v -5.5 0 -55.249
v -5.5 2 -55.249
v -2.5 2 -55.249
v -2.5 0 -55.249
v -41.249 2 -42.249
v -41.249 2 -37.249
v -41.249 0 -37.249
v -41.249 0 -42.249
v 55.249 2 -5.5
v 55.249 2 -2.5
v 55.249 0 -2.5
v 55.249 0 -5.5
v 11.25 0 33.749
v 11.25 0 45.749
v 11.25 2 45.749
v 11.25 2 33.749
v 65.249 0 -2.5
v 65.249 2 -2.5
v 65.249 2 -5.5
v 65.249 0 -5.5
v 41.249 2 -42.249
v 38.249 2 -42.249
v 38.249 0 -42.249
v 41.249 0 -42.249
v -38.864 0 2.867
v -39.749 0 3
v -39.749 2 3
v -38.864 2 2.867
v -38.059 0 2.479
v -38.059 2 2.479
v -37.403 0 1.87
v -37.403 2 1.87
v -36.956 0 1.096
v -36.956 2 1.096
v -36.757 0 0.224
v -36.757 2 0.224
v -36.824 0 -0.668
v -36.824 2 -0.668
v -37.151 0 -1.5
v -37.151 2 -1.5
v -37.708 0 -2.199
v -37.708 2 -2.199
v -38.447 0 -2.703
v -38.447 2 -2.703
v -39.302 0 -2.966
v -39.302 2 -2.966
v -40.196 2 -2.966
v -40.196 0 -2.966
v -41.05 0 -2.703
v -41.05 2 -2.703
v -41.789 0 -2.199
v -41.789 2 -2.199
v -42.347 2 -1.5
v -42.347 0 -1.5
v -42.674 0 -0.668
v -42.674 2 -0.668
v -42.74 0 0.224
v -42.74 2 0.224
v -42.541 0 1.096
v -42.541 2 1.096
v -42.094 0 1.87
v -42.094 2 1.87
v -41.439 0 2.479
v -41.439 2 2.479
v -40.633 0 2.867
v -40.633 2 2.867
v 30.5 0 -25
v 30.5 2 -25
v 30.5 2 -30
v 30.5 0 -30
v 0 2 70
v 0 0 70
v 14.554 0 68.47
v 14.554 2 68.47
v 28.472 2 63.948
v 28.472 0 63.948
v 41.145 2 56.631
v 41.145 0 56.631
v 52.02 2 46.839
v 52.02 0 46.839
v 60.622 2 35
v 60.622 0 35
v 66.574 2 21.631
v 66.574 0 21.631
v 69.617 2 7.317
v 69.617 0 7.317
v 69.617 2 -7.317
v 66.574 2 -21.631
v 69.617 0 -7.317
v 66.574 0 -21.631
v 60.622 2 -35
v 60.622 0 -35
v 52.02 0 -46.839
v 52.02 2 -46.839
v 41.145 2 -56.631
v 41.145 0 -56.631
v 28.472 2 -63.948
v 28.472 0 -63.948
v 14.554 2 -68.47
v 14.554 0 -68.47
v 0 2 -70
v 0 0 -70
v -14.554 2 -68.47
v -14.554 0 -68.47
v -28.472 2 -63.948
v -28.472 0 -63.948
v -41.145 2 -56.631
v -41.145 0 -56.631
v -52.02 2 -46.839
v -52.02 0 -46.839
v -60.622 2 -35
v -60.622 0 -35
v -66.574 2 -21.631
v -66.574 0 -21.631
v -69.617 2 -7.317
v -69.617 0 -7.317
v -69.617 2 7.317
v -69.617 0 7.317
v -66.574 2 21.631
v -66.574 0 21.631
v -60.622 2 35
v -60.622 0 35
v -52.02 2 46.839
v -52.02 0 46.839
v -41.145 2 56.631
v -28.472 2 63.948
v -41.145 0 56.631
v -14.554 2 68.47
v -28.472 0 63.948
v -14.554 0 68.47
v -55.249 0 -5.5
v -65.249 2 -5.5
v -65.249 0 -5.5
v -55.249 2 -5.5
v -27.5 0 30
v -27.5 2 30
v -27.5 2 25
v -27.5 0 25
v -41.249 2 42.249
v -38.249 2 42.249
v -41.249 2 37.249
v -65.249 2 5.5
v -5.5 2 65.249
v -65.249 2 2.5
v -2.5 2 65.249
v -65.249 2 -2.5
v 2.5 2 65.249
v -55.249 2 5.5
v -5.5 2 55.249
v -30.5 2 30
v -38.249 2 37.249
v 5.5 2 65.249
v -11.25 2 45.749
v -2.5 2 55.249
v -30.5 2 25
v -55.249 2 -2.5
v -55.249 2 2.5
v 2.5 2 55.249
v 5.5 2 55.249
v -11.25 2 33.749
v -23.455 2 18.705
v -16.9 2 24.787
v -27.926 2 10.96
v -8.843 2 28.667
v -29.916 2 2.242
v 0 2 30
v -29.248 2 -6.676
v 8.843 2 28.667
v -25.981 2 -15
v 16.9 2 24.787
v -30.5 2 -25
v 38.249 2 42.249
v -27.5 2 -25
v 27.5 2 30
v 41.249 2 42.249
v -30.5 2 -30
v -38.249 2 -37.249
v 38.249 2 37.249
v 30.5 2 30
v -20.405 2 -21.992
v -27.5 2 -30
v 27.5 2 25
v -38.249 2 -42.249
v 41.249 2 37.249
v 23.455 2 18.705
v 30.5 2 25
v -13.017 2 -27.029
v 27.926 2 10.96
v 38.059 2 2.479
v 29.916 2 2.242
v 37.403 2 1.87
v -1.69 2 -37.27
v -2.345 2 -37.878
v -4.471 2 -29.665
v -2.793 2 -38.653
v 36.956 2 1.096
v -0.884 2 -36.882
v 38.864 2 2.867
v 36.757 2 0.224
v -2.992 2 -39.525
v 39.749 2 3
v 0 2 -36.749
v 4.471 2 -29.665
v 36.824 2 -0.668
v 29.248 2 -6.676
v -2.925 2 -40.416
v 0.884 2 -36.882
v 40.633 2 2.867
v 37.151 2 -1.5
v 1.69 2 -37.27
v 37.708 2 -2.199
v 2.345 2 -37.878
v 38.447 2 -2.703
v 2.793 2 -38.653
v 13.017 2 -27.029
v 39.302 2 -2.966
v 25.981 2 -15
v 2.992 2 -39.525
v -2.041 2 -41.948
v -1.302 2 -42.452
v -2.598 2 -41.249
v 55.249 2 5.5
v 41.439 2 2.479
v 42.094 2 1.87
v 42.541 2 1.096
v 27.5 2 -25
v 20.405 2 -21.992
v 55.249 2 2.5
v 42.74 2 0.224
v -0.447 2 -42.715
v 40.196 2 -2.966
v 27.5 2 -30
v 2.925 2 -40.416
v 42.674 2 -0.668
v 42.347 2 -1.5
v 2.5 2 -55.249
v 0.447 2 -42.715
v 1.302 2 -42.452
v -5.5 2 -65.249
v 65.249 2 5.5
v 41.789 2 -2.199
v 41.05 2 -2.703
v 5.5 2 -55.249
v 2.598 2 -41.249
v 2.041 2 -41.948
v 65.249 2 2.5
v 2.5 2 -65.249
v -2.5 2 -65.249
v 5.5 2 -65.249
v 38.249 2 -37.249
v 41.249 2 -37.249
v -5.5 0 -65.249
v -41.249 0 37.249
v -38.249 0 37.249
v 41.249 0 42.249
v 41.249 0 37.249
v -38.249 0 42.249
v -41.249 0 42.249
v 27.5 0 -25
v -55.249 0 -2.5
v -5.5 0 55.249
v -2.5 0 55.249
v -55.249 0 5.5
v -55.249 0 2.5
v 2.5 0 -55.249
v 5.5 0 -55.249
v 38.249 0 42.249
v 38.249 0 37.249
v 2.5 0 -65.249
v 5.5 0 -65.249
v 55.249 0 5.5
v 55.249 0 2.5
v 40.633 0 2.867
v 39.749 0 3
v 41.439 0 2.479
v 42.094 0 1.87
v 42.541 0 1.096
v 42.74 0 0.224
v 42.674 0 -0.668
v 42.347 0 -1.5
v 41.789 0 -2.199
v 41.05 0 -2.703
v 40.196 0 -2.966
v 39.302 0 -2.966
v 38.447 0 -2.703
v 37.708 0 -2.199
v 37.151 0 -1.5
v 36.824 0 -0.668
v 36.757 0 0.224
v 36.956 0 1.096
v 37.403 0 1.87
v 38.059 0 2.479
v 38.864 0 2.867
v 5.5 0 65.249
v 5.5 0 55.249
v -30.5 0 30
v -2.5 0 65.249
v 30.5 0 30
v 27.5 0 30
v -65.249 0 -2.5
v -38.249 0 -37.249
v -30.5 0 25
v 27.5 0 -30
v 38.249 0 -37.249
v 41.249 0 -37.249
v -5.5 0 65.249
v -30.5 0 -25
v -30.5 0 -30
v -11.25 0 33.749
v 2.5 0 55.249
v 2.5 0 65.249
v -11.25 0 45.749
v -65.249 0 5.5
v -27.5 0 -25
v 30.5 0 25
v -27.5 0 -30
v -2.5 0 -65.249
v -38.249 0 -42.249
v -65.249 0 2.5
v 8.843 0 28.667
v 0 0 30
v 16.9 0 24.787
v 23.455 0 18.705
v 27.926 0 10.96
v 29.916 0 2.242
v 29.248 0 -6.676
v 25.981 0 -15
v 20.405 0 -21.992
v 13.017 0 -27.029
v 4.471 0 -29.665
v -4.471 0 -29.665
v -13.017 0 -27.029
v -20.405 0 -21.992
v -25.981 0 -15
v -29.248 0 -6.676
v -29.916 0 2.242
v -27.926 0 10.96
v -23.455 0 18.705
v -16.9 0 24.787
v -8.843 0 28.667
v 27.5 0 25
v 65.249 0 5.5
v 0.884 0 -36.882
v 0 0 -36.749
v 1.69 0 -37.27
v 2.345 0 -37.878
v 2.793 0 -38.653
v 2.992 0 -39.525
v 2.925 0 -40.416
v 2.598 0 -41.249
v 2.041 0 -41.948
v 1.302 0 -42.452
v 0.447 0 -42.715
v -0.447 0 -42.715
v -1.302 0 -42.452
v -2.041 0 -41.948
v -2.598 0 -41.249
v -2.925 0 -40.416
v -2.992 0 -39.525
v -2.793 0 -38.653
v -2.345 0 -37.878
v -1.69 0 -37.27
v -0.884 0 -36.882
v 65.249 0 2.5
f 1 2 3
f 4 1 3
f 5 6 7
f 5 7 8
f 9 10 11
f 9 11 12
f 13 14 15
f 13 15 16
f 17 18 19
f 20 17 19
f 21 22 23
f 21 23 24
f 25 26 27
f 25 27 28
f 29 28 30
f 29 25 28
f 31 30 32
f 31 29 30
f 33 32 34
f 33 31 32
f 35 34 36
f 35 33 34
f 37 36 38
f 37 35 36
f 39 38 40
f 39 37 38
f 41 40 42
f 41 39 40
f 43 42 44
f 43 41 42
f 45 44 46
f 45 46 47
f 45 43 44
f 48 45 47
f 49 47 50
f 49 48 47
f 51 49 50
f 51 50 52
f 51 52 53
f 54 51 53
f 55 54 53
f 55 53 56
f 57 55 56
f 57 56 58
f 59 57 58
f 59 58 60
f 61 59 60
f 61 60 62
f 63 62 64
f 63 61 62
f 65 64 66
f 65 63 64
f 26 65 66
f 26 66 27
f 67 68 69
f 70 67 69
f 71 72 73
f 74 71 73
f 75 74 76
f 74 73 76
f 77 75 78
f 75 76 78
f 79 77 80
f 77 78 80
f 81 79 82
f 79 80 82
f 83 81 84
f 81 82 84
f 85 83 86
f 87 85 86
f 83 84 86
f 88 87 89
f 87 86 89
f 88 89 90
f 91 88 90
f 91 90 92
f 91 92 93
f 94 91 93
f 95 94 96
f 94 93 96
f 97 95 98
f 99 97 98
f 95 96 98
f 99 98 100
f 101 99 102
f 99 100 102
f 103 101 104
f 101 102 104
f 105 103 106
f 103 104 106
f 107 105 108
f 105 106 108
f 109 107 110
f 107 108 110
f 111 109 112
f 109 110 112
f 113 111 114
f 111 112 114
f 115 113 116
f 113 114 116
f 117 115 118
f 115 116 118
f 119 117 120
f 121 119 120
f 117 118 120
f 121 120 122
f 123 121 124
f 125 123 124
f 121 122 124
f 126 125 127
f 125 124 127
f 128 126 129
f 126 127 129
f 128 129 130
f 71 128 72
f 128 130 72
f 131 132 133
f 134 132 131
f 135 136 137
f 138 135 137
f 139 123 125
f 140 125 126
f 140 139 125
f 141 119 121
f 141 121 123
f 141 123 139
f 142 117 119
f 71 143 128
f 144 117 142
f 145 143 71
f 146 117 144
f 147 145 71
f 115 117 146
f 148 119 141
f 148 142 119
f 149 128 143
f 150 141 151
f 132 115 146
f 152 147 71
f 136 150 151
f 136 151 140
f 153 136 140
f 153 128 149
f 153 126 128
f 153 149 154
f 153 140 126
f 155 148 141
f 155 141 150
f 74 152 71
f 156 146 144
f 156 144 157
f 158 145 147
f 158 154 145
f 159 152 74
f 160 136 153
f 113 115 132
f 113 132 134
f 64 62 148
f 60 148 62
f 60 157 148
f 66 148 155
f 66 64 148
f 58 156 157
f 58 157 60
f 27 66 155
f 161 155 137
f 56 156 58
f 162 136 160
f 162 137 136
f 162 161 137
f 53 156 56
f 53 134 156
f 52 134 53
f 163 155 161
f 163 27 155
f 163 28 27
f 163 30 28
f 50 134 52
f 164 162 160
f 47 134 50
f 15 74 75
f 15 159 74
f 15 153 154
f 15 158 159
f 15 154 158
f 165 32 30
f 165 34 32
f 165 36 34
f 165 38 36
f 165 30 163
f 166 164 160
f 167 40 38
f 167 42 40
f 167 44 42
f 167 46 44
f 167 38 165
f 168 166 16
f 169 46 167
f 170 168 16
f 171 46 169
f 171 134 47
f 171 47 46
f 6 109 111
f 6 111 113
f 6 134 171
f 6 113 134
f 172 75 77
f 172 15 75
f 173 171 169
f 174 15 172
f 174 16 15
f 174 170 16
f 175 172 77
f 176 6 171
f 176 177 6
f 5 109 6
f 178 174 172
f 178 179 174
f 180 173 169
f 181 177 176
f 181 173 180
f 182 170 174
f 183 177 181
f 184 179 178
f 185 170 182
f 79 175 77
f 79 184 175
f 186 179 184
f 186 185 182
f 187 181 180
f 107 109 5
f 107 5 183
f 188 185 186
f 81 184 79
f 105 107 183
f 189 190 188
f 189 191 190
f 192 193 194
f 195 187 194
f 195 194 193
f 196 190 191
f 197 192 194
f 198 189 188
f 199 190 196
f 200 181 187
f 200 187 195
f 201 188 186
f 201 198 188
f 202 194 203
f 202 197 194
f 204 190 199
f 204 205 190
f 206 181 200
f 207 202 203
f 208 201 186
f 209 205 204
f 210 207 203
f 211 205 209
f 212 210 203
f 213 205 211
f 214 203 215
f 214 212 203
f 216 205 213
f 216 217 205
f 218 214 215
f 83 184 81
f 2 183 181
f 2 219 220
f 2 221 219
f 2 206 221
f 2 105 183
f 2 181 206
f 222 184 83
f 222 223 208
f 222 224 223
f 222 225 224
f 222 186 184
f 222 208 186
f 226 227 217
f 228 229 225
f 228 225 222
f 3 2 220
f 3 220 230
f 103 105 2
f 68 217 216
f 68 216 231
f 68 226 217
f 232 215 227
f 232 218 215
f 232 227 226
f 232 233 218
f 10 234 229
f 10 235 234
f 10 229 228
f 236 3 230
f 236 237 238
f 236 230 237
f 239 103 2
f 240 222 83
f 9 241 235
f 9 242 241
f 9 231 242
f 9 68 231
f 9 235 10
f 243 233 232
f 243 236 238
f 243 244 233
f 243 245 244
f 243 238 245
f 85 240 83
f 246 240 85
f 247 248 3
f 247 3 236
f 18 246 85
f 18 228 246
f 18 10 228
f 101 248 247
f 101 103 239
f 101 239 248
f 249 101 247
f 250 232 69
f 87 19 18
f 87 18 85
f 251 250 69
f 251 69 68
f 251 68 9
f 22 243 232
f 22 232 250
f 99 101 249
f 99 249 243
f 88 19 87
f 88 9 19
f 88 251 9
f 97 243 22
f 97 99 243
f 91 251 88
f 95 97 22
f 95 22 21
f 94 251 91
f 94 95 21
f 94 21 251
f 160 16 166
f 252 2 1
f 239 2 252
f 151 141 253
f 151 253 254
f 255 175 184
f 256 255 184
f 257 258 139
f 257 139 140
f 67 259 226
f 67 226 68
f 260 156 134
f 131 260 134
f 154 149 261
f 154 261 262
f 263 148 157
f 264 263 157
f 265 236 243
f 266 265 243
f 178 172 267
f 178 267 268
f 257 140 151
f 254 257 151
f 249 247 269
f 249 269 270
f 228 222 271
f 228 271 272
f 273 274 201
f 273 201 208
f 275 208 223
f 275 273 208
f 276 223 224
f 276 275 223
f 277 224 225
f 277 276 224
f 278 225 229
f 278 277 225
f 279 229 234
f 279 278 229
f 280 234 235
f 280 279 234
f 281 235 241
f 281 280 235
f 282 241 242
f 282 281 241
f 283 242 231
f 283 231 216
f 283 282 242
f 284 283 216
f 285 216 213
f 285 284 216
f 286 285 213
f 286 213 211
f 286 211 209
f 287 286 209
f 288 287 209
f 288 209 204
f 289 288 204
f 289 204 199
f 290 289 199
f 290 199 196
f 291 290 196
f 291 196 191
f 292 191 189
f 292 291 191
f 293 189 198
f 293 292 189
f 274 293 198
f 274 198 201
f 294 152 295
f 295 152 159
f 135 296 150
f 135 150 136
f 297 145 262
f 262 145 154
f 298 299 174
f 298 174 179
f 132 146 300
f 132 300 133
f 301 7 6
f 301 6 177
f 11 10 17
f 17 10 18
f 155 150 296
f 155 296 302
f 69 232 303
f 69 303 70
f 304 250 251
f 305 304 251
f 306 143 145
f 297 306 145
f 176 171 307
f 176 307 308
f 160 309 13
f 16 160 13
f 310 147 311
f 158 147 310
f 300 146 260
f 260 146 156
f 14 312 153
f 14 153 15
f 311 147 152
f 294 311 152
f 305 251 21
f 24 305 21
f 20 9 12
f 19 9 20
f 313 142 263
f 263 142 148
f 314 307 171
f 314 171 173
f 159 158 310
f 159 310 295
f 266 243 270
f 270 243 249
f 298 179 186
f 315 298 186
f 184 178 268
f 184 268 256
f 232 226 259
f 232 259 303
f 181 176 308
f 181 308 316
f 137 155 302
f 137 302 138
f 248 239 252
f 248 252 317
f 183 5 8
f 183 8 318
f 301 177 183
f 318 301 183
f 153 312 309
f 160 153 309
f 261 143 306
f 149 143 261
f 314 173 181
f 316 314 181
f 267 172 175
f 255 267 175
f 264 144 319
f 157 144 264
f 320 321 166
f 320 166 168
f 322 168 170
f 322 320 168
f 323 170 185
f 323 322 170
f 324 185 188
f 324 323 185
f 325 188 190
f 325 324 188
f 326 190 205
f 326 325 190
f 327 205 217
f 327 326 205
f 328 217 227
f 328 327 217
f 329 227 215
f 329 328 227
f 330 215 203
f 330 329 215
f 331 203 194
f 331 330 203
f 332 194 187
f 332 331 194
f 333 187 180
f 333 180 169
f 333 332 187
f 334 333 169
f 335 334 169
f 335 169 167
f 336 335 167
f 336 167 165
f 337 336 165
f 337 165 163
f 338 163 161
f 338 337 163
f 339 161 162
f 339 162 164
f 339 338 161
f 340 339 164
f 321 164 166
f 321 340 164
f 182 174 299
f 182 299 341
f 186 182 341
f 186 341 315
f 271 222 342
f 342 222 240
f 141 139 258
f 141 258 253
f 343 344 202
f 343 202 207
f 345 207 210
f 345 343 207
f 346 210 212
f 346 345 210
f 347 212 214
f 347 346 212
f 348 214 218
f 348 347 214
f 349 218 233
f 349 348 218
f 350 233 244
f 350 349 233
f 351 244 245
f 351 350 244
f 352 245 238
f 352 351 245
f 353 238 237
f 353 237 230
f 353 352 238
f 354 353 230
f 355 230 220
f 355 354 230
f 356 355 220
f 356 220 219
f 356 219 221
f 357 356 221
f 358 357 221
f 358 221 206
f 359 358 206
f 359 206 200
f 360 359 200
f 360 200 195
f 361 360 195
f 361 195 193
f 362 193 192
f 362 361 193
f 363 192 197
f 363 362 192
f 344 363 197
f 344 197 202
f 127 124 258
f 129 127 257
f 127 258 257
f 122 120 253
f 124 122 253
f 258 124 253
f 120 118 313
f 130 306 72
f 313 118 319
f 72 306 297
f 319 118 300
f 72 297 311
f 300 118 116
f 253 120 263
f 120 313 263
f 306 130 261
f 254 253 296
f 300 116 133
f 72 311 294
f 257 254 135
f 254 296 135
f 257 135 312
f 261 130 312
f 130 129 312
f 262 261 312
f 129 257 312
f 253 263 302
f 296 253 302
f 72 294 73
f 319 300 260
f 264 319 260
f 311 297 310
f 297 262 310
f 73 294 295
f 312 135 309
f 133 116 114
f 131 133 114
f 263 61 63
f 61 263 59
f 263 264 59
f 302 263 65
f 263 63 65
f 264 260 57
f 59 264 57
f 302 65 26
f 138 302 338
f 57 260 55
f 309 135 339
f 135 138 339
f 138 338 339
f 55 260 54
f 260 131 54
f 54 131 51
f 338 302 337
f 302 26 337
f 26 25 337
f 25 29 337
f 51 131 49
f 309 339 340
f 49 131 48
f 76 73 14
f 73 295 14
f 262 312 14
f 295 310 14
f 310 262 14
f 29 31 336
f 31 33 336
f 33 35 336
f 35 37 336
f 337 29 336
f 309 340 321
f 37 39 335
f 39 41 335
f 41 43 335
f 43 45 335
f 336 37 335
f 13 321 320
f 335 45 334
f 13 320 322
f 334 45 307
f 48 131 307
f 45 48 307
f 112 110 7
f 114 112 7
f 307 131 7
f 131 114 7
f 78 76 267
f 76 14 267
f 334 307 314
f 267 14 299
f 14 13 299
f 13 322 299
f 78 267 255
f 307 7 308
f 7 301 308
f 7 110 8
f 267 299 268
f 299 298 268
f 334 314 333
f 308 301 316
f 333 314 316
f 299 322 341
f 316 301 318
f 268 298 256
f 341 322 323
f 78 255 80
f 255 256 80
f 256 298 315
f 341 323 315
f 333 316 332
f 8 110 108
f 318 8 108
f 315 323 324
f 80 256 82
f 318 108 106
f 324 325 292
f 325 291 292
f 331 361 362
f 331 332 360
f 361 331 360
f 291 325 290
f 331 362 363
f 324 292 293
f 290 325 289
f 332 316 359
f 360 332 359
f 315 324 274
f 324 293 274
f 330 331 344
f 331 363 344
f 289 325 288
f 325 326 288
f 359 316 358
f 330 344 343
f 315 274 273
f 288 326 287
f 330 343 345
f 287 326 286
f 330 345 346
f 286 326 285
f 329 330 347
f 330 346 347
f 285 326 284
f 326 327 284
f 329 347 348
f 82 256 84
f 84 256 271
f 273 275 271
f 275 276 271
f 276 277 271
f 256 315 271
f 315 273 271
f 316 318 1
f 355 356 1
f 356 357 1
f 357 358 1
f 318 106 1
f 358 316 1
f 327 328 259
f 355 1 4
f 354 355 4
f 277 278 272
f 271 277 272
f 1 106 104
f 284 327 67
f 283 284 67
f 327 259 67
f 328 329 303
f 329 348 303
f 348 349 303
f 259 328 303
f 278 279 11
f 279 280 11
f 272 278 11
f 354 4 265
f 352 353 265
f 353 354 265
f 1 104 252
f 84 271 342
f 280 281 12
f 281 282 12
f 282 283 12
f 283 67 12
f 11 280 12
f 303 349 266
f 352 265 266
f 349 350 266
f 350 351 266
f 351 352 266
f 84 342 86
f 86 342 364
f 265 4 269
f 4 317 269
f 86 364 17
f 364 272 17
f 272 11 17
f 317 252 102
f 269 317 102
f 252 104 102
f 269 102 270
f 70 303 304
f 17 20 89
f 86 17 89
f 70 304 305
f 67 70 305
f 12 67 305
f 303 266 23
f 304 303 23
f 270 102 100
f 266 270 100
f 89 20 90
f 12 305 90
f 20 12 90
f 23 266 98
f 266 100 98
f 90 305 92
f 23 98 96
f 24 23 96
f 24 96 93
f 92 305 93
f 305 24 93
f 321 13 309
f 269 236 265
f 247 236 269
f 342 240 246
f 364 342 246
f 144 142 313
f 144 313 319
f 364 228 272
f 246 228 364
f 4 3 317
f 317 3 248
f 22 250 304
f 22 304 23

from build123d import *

# Parameters (mm, degrees)
SKETCH1_R                   = 70
SKETCH1_R_2                 = 30
SKETCH1_R_3                 = 3
SKETCH1_W                   = 2
SKETCH1_H                   = 5
SKETCH1_W_2                 = 22.5
SKETCH1_H_2                 = 12
SKETCH1_W_3                 = 5
SKETCH1_H_3                 = 2
Y_KSEKLIK_EKSTR_ZYON1_DEPTH = 2
SKETCH3_W                   = 2
SKETCH3_H                   = 2
SKETCH3_W_2                 = 3
BOSS_EXTRUDE1_DEPTH         = 2
SKETCH5_W                   = 5
SKETCH5_H                   = 2
CUT_EXTRUDE1_DEPTH          = 2
SKETCH6_W                   = 2
SKETCH6_H                   = 2
SKETCH6_W_2                 = 3
BOSS_EXTRUDE3_DEPTH         = 2
SKETCH8_W                   = 5
SKETCH8_H                   = 2
CUT_EXTRUDE2_DEPTH          = 2
SKETCH9_W                   = 2
SKETCH9_H                   = 2
SKETCH9_H_2                 = 3
BOSS_EXTRUDE4_DEPTH         = 2
SKETCH10_W                  = 2
SKETCH10_H                  = 2
SKETCH10_H_2                = 3
BOSS_EXTRUDE5_DEPTH         = 2
SKETCH12_W                  = 2
SKETCH12_H                  = 5
CUT_EXTRUDE4_DEPTH          = 2
SKETCH13_W                  = 2
SKETCH13_H                  = 5
CUT_EXTRUDE5_DEPTH          = 2
SKETCH14_W                  = 3
SKETCH14_H                  = 2
SKETCH14_W_2                = 2
BOSS_EXTRUDE6_DEPTH         = 2
SKETCH15_W                  = 5
SKETCH15_H                  = 2
CUT_EXTRUDE6_DEPTH          = 2
SKETCH16_W                  = 3
SKETCH16_H                  = 2
SKETCH16_W_2                = 2
BOSS_EXTRUDE9_DEPTH         = 2
SKETCH17_W                  = 5
SKETCH17_H                  = 2
CUT_EXTRUDE7_DEPTH          = 2
SKETCH18_W                  = 2
SKETCH18_H                  = 3
SKETCH18_H_2                = 2
BOSS_EXTRUDE10_DEPTH        = 2
SKETCH19_W                  = 2
SKETCH19_H                  = 5
CUT_EXTRUDE8_DEPTH          = 2
SKETCH20_W                  = 3
SKETCH20_H                  = 10
SKETCH20_W_2                = 10
SKETCH20_H_2                = 3
SKETCH20_H_3                = 5
CUT_EXTRUDE9_DEPTH          = 2


with BuildPart() as part:
    # Sketch1 → Yükseklik-Ekstrüzyon1 (new body)
    with BuildSketch(Plane(origin=(0, 0, 0), x_dir=(1, 0, 0), z_dir=(0, 1, 0))):
        with Locations(Location((0, 0, 0), (0, 0, 270))):
            Circle(SKETCH1_R)
        with Locations(Location((0, 0, 0), (0, 0, 270))):
            Circle(SKETCH1_R_2, mode=Mode.SUBTRACT)
        with Locations(Location((39.748737342, 0, 0), (0, 0, 270))):
            Circle(SKETCH1_R_3, mode=Mode.SUBTRACT)
        with Locations(Location((-39.748737342, 0, 0), (0, 0, 270))):
            Circle(SKETCH1_R_3, mode=Mode.SUBTRACT)
        with Locations(Location((0, 39.748737342, 0), (0, 0, 270))):
            Circle(SKETCH1_R_3, mode=Mode.SUBTRACT)
        with Locations((-29, 27.5)):
            Rectangle(SKETCH1_W, SKETCH1_H, mode=Mode.SUBTRACT)
        with Locations((29, 27.5)):
            Rectangle(SKETCH1_W, SKETCH1_H, mode=Mode.SUBTRACT)
        with Locations((-29, -27.5)):
            Rectangle(SKETCH1_W, SKETCH1_H, mode=Mode.SUBTRACT)
        with Locations((29, -27.5)):
            Rectangle(SKETCH1_W, SKETCH1_H, mode=Mode.SUBTRACT)
        with Locations((-39.748737342, 39.748737342)):
            Rectangle(SKETCH1_W, SKETCH1_H, mode=Mode.SUBTRACT)
        with Locations((39.748737342, 39.748737342)):
            Rectangle(SKETCH1_W, SKETCH1_H, mode=Mode.SUBTRACT)
        with Locations((39.748737342, -39.748737342)):
            Rectangle(SKETCH1_W, SKETCH1_H, mode=Mode.SUBTRACT)
        with Locations((-39.748737342, -39.748737342)):
            Rectangle(SKETCH1_W, SKETCH1_H, mode=Mode.SUBTRACT)
        with Locations((0, -39.748737342)):
            Rectangle(SKETCH1_W_2, SKETCH1_H_2, mode=Mode.SUBTRACT)
        with Locations((-64.748737342, 4)):
            Rectangle(SKETCH1_W_3, SKETCH1_H_3, mode=Mode.SUBTRACT)
        with Locations((-64.748737342, -4)):
            Rectangle(SKETCH1_W_3, SKETCH1_H_3, mode=Mode.SUBTRACT)
        with Locations((-54.748737342, -4)):
            Rectangle(SKETCH1_W_3, SKETCH1_H_3, mode=Mode.SUBTRACT)
        with Locations((-54.748737342, 4)):
            Rectangle(SKETCH1_W_3, SKETCH1_H_3, mode=Mode.SUBTRACT)
        with Locations((-4, 64.748737342)):
            Rectangle(SKETCH1_W, SKETCH1_H, mode=Mode.SUBTRACT)
        with Locations((-4, 54.748737342)):
            Rectangle(SKETCH1_W, SKETCH1_H, mode=Mode.SUBTRACT)
        with Locations((4, 54.748737342)):
            Rectangle(SKETCH1_W, SKETCH1_H, mode=Mode.SUBTRACT)
        with Locations((4, 64.748737342)):
            Rectangle(SKETCH1_W, SKETCH1_H, mode=Mode.SUBTRACT)
        with Locations((54.748737342, 4)):
            Rectangle(SKETCH1_W_3, SKETCH1_H_3, mode=Mode.SUBTRACT)
        with Locations((54.748737342, -4)):
            Rectangle(SKETCH1_W_3, SKETCH1_H_3, mode=Mode.SUBTRACT)
        with Locations((64.748737342, 4)):
            Rectangle(SKETCH1_W_3, SKETCH1_H_3, mode=Mode.SUBTRACT)
        with Locations((64.748737342, -4)):
            Rectangle(SKETCH1_W_3, SKETCH1_H_3, mode=Mode.SUBTRACT)
        with Locations((-4, -54.748737342)):
            Rectangle(SKETCH1_W, SKETCH1_H, mode=Mode.SUBTRACT)
        with Locations((4, -54.748737342)):
            Rectangle(SKETCH1_W, SKETCH1_H, mode=Mode.SUBTRACT)
        with Locations((4, -64.748737342)):
            Rectangle(SKETCH1_W, SKETCH1_H, mode=Mode.SUBTRACT)
        with Locations((-4, -64.748737342)):
            Rectangle(SKETCH1_W, SKETCH1_H, mode=Mode.SUBTRACT)
    extrude(amount=Y_KSEKLIK_EKSTR_ZYON1_DEPTH)

    # Sketch3 → Boss-Extrude1 (add)
    with BuildSketch(Plane(origin=(0, 2, 0), x_dir=(1, 0, 0), z_dir=(0, 1, 0))):
        with Locations((-66.248737342, 4)):
            Rectangle(SKETCH3_W, SKETCH3_H)
        with Locations((-53.748737342, 4)):
            Rectangle(SKETCH3_W_2, SKETCH3_H)
    extrude(amount=-BOSS_EXTRUDE1_DEPTH)

    # Sketch5 → Cut-Extrude1 (cut)
    with BuildSketch(Plane(origin=(0, 2, 0), x_dir=(1, 0, 0), z_dir=(0, 1, 0))):
        with Locations((-59.748737342, 4)):
            Rectangle(SKETCH5_W, SKETCH5_H)
    extrude(amount=-CUT_EXTRUDE1_DEPTH, mode=Mode.SUBTRACT)

    # Sketch6 → Boss-Extrude3 (add)
    with BuildSketch(Plane(origin=(0, 2, 0), x_dir=(1, 0, 0), z_dir=(0, 1, 0))):
        with Locations((-66.248737342, -4)):
            Rectangle(SKETCH6_W, SKETCH6_H)
        with Locations((-53.748737342, -4)):
            Rectangle(SKETCH6_W_2, SKETCH6_H)
    extrude(amount=-BOSS_EXTRUDE3_DEPTH)

    # Sketch8 → Cut-Extrude2 (cut)
    with BuildSketch(Plane(origin=(0, 2, 0), x_dir=(1, 0, 0), z_dir=(0, 1, 0))):
        with Locations((-59.748737342, -4)):
            Rectangle(SKETCH8_W, SKETCH8_H)
    extrude(amount=-CUT_EXTRUDE2_DEPTH, mode=Mode.SUBTRACT)

    # Sketch9 → Boss-Extrude4 (add)
    with BuildSketch(Plane(origin=(0, 2, 0), x_dir=(1, 0, 0), z_dir=(0, 1, 0))):
        with Locations((4, 66.248737342)):
            Rectangle(SKETCH9_W, SKETCH9_H)
        with Locations((4, 53.748737342)):
            Rectangle(SKETCH9_W, SKETCH9_H_2)
    extrude(amount=-BOSS_EXTRUDE4_DEPTH)

    # Sketch10 → Boss-Extrude5 (add)
    with BuildSketch(Plane(origin=(0, 2, 0), x_dir=(1, 0, 0), z_dir=(0, 1, 0))):
        with Locations((-4, 66.248737342)):
            Rectangle(SKETCH10_W, SKETCH10_H)
        with Locations((-4, 53.748737342)):
            Rectangle(SKETCH10_W, SKETCH10_H_2)
    extrude(amount=-BOSS_EXTRUDE5_DEPTH)

    # Sketch12 → Cut-Extrude4 (cut)
    with BuildSketch(Plane(origin=(0, 2, 0), x_dir=(1, 0, 0), z_dir=(0, 1, 0))):
        with Locations((-4, 59.748737342)):
            Rectangle(SKETCH12_W, SKETCH12_H)
    extrude(amount=-CUT_EXTRUDE4_DEPTH, mode=Mode.SUBTRACT)

    # Sketch13 → Cut-Extrude5 (cut)
    with BuildSketch(Plane(origin=(0, 2, 0), x_dir=(1, 0, 0), z_dir=(0, 1, 0))):
        with Locations((4, 59.748737342)):
            Rectangle(SKETCH13_W, SKETCH13_H)
    extrude(amount=-CUT_EXTRUDE5_DEPTH, mode=Mode.SUBTRACT)

    # Sketch14 → Boss-Extrude6 (add)
    with BuildSketch(Plane(origin=(0, 2, 0), x_dir=(1, 0, 0), z_dir=(0, 1, 0))):
        with Locations((53.748737342, 4)):
            Rectangle(SKETCH14_W, SKETCH14_H)
        with Locations((66.248737342, 4)):
            Rectangle(SKETCH14_W_2, SKETCH14_H)
    extrude(amount=-BOSS_EXTRUDE6_DEPTH)

    # Sketch15 → Cut-Extrude6 (cut)
    with BuildSketch(Plane(origin=(0, 2, 0), x_dir=(1, 0, 0), z_dir=(0, 1, 0))):
        with Locations((59.748737342, 4)):
            Rectangle(SKETCH15_W, SKETCH15_H)
    extrude(amount=-CUT_EXTRUDE6_DEPTH, mode=Mode.SUBTRACT)

    # Sketch16 → Boss-Extrude9 (add)
    with BuildSketch(Plane(origin=(0, 2, 0), x_dir=(1, 0, 0), z_dir=(0, 1, 0))):
        with Locations((53.748737342, -4)):
            Rectangle(SKETCH16_W, SKETCH16_H)
        with Locations((66.248737342, -4)):
            Rectangle(SKETCH16_W_2, SKETCH16_H)
    extrude(amount=-BOSS_EXTRUDE9_DEPTH)

    # Sketch17 → Cut-Extrude7 (cut)
    with BuildSketch(Plane(origin=(0, 2, 0), x_dir=(1, 0, 0), z_dir=(0, 1, 0))):
        with Locations((59.748737342, -4)):
            Rectangle(SKETCH17_W, SKETCH17_H)
    extrude(amount=-CUT_EXTRUDE7_DEPTH, mode=Mode.SUBTRACT)

    # Sketch18 → Boss-Extrude10 (add)
    with BuildSketch(Plane(origin=(0, 2, 0), x_dir=(1, 0, 0), z_dir=(0, 1, 0))):
        with Locations((-4, -53.748737342)):
            Rectangle(SKETCH18_W, SKETCH18_H)
        with Locations((-4, -66.248737342)):
            Rectangle(SKETCH18_W, SKETCH18_H_2)
        with Locations((4, -66.248737342)):
            Rectangle(SKETCH18_W, SKETCH18_H_2)
        with Locations((4, -53.748737342)):
            Rectangle(SKETCH18_W, SKETCH18_H)
    extrude(amount=-BOSS_EXTRUDE10_DEPTH)

    # Sketch19 → Cut-Extrude8 (cut)
    with BuildSketch(Plane(origin=(0, 2, 0), x_dir=(1, 0, 0), z_dir=(0, 1, 0))):
        with Locations((4, -59.748737342)):
            Rectangle(SKETCH19_W, SKETCH19_H)
        with Locations((-4, -59.748737342)):
            Rectangle(SKETCH19_W, SKETCH19_H)
    extrude(amount=-CUT_EXTRUDE8_DEPTH, mode=Mode.SUBTRACT)

    # Sketch20 → Cut-Extrude9 (cut)
    with BuildSketch(Plane(origin=(0, 2, 0), x_dir=(1, 0, 0), z_dir=(0, 1, 0))):
        with Locations((-4, 60.248737342)):
            Rectangle(SKETCH20_W, SKETCH20_H)
        with Locations((4, 60.248737342)):
            Rectangle(SKETCH20_W, SKETCH20_H)
        with Locations((60.248737342, 4)):
            Rectangle(SKETCH20_W_2, SKETCH20_H_2)
        with Locations((60.248737342, -4)):
            Rectangle(SKETCH20_W_2, SKETCH20_H_2)
        with Locations((4, -60.248737342)):
            Rectangle(SKETCH20_W, SKETCH20_H)
        with Locations((-4, -60.248737342)):
            Rectangle(SKETCH20_W, SKETCH20_H)
        with Locations((-60.248737342, 4)):
            Rectangle(SKETCH20_W_2, SKETCH20_H_2)
        with Locations((-60.248737342, -4)):
            Rectangle(SKETCH20_W_2, SKETCH20_H_2)
        with Locations((-29, 27.5)):
            Rectangle(SKETCH20_W, SKETCH20_H_3)
        with Locations((-39.748737342, 39.748737342)):
            Rectangle(SKETCH20_W, SKETCH20_H_3)
        with Locations((29, 27.5)):
            Rectangle(SKETCH20_W, SKETCH20_H_3)
        with Locations((39.748737342, 39.748737342)):
            Rectangle(SKETCH20_W, SKETCH20_H_3)
        with Locations((29, -27.5)):
            Rectangle(SKETCH20_W, SKETCH20_H_3)
        with Locations((39.748737342, -39.748737342)):
            Rectangle(SKETCH20_W, SKETCH20_H_3)
        with Locations((-29, -27.5)):
            Rectangle(SKETCH20_W, SKETCH20_H_3)
        with Locations((-39.748737342, -39.748737342)):
            Rectangle(SKETCH20_W, SKETCH20_H_3)
    extrude(amount=-CUT_EXTRUDE9_DEPTH, mode=Mode.SUBTRACT)


solid = part.part
